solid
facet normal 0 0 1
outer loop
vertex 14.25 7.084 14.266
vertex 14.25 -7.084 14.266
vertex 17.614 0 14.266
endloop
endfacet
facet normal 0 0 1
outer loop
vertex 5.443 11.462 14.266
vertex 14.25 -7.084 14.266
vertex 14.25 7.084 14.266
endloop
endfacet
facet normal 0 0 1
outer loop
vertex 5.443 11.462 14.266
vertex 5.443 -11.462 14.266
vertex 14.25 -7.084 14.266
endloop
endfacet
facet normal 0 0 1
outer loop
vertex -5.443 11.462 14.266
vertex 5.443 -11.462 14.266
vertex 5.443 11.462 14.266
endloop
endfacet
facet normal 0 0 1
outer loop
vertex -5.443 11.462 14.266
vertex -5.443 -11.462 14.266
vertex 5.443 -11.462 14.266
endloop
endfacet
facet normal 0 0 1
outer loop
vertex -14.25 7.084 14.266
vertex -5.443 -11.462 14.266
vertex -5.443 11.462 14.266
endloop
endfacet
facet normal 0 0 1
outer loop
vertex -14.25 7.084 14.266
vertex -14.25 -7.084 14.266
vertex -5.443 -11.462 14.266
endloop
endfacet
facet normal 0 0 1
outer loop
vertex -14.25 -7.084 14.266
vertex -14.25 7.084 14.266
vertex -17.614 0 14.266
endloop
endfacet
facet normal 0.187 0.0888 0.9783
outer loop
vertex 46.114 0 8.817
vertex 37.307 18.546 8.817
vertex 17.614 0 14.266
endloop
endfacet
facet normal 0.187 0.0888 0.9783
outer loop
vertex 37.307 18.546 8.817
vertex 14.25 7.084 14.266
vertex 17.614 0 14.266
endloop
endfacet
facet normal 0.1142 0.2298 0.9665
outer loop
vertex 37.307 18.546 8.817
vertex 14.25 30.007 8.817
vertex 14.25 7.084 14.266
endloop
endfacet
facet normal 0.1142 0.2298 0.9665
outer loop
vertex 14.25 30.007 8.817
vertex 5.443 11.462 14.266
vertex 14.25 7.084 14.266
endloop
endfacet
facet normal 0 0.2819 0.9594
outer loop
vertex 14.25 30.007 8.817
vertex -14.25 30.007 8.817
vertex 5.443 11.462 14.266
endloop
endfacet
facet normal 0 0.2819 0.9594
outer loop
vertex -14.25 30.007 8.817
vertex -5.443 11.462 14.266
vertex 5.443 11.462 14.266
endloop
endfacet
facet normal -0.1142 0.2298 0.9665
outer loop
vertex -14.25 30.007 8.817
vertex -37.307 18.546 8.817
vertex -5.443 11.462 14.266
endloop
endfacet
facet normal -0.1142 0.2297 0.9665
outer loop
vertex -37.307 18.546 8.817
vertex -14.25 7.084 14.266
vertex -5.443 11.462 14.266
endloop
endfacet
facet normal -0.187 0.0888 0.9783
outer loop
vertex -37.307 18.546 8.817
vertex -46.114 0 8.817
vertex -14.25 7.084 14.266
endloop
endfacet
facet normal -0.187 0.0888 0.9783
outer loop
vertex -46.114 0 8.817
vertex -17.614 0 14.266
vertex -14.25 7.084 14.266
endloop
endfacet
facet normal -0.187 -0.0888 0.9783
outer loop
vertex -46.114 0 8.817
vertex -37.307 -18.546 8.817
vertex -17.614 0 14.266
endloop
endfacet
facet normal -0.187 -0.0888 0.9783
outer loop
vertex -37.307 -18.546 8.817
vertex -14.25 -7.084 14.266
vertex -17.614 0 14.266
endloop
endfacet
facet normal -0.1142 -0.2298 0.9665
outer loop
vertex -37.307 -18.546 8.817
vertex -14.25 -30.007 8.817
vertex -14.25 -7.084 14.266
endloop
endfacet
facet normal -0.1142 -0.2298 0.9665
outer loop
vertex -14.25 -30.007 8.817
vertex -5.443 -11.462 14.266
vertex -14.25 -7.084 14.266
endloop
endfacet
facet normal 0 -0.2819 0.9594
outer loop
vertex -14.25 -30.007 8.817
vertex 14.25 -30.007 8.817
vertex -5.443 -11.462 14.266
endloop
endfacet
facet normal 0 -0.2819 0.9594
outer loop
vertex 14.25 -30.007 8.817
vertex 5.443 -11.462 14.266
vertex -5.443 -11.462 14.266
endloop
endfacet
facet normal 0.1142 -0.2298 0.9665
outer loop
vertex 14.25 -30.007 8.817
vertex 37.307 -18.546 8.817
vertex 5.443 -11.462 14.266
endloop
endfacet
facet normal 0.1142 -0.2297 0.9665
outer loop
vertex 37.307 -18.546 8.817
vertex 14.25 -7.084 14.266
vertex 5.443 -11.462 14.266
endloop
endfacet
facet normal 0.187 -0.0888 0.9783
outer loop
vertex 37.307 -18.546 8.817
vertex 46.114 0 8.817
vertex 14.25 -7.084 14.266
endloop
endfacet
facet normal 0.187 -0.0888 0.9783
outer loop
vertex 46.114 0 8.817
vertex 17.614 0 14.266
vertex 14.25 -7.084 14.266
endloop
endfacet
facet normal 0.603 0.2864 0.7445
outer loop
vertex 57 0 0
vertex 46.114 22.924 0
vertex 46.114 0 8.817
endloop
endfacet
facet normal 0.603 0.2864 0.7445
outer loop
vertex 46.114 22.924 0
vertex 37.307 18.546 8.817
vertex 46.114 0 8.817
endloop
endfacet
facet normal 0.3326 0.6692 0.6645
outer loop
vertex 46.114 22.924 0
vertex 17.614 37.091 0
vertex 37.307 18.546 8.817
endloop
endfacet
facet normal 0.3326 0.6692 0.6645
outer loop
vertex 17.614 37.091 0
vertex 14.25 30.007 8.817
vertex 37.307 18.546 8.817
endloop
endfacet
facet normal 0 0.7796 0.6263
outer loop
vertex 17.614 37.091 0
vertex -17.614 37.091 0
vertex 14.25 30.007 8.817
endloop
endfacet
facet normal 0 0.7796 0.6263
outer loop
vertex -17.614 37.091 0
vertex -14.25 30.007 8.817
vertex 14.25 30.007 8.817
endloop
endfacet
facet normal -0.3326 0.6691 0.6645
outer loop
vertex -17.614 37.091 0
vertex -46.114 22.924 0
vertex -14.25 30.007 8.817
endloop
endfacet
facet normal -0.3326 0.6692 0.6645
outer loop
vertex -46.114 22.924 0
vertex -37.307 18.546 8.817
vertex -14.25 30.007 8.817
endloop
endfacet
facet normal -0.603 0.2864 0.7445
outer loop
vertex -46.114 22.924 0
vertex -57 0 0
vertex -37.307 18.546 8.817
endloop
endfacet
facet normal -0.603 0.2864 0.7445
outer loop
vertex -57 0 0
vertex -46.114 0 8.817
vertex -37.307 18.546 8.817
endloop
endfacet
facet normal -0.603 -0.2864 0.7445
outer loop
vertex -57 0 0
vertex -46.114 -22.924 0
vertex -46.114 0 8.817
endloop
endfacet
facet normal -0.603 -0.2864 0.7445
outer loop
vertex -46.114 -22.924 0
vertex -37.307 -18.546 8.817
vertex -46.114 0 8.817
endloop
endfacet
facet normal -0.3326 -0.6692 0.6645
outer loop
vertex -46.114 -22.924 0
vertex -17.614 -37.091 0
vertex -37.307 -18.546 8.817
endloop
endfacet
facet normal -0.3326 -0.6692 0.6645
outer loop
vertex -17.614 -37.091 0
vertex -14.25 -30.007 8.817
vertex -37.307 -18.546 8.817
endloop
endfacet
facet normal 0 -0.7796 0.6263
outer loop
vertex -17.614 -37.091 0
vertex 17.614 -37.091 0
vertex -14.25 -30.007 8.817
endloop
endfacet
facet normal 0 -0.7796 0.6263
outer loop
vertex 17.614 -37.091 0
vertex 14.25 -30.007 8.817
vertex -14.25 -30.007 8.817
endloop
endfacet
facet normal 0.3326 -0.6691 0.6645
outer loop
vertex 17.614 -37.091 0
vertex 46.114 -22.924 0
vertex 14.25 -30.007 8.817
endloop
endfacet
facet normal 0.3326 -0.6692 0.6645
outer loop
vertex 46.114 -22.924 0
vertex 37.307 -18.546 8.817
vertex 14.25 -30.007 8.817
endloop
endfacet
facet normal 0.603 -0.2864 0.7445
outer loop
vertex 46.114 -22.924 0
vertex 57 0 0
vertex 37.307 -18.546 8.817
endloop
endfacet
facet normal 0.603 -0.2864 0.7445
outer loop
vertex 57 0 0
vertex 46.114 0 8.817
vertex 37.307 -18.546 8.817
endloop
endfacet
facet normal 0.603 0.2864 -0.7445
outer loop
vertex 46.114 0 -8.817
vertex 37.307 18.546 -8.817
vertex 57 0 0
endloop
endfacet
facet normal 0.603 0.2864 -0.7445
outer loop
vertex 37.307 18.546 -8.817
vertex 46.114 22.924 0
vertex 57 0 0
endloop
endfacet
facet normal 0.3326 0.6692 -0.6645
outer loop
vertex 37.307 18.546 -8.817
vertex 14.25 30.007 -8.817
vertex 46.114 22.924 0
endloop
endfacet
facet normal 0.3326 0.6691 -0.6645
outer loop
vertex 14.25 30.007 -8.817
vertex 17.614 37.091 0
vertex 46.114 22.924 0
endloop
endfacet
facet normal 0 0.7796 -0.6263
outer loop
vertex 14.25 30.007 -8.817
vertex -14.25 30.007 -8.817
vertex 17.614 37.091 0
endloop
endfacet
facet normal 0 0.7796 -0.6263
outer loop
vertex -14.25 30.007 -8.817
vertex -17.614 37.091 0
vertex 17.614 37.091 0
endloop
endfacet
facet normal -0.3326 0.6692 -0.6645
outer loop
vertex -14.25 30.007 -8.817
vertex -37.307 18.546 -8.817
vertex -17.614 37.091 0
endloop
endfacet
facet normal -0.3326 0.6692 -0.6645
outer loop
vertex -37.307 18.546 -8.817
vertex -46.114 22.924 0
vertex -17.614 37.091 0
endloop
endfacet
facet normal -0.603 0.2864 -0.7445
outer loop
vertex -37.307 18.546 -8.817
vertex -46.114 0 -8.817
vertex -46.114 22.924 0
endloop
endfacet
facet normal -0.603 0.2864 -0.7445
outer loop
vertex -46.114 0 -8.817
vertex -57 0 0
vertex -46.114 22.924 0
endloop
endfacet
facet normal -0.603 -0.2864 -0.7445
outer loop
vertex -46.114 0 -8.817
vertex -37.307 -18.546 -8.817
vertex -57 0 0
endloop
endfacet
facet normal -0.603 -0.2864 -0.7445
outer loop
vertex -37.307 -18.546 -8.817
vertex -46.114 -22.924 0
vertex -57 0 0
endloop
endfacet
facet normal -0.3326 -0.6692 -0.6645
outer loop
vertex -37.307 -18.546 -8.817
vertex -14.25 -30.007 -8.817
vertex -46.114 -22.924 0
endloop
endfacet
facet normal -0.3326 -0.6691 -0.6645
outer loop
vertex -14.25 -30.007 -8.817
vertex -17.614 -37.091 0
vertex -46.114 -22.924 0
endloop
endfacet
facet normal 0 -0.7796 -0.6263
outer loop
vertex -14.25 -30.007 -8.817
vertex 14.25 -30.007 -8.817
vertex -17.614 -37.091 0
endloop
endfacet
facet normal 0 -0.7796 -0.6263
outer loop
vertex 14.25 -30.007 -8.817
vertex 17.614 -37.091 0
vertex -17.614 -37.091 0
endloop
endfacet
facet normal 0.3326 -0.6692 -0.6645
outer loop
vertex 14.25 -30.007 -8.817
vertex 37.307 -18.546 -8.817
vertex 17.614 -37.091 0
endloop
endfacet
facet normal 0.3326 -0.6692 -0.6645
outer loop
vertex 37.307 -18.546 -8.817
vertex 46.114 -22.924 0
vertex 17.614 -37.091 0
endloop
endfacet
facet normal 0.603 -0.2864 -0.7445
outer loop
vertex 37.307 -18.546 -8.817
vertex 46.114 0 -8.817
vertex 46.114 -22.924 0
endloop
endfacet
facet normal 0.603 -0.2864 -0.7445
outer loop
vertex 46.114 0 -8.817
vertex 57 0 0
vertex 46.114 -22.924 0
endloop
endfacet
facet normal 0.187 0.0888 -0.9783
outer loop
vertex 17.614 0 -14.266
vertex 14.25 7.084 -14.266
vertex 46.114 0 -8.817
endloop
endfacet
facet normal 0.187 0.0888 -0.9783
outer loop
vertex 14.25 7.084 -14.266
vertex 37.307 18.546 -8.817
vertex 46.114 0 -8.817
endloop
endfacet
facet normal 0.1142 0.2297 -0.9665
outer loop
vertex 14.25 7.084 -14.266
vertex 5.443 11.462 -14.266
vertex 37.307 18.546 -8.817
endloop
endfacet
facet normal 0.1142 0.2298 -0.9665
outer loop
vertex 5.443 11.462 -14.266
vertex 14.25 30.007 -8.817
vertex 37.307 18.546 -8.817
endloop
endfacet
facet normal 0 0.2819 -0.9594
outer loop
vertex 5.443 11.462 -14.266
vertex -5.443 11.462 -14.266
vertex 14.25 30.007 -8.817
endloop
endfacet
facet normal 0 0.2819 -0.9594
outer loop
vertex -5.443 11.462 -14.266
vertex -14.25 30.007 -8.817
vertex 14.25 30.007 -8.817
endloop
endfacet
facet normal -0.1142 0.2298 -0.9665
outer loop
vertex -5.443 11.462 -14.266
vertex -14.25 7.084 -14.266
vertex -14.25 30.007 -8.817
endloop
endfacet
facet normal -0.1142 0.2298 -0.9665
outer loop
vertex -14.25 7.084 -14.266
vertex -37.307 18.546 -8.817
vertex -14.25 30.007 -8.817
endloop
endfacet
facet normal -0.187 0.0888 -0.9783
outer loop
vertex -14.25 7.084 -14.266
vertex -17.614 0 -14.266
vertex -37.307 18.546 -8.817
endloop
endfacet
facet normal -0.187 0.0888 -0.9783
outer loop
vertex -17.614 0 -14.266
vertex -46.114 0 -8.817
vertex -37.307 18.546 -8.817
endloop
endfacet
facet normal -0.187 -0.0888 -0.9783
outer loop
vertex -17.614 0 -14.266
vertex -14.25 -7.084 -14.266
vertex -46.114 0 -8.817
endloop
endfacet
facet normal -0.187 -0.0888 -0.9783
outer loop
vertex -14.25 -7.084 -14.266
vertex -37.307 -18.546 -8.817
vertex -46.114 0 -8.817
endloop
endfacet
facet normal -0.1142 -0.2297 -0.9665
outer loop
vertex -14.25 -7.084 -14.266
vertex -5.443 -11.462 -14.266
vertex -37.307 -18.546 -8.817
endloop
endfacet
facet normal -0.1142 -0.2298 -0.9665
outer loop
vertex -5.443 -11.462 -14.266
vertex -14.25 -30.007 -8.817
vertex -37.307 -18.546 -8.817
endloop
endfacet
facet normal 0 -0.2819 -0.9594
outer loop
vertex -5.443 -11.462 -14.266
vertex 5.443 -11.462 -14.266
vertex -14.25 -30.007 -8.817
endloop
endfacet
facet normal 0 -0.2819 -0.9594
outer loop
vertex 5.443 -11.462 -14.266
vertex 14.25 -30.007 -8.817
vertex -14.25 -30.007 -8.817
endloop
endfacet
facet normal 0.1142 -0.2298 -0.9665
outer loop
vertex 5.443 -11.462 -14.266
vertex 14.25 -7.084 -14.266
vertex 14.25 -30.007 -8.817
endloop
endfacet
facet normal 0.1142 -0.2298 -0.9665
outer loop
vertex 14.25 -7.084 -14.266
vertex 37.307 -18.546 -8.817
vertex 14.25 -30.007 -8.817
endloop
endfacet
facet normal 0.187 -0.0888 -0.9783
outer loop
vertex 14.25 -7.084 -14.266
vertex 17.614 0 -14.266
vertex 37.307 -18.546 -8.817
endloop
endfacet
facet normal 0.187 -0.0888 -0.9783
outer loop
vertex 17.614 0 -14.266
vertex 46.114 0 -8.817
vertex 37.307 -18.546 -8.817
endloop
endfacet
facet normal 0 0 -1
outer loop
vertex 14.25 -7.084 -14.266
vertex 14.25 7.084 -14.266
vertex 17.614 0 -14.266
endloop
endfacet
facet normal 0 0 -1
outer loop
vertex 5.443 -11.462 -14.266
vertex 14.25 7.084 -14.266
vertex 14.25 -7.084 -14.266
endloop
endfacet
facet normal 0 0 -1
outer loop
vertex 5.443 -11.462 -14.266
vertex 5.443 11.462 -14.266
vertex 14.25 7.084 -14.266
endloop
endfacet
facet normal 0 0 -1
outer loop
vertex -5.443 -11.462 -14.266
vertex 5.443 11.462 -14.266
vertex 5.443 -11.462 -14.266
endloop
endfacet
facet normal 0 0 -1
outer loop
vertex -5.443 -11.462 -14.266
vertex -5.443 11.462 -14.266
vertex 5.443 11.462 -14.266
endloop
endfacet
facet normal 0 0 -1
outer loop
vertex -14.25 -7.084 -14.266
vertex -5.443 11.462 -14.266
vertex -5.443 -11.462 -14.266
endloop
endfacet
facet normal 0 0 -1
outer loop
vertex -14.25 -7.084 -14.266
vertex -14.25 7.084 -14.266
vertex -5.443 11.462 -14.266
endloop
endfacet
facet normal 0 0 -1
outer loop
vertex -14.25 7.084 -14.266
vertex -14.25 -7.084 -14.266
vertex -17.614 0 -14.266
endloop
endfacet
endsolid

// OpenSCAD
// Generated by SolidPython 1.0.1 on 2020-07-29 00:46:54


scale(v = [19, 13, 5]) {
	sphere(r = 3);
}
/***********************************************
*********      SolidPython code:      **********
************************************************
 
# import packages: SolidPython
from solid import *
from solid.utils import *
from itertools import chain, combinations, permutations


class Resize:

    def __init__(self, scad_file):
        self.scad_file = scad_file
        #self.scad_file = import_scad(scad_file)
        # cone/cylinder param:
        self.r1 = 0
        self.r2 = 0
        self.h = 0
        # rectangular prism param:
        self.w = 0
        self.l = 0
        # ellipse param:
        self.r = 0

    # import OpenScad code (file name corresponds to shape)


    # classify shape + parameters
    def assign(self, param1, param2, param3):
        if self.scad_file == 'cone.scad':
            self.r1 = param1
            self.r2 = param2
            self.h = param3
        elif self.scad_file == 'cylinder.scad':
            self.r1 = param1
            self.r2 = param2
            self.h = param3
        elif self.scad_file == 'rectangularPrism.scad':
            self.h = param1
            self.l = param2
            self.w = param3
        else:
            self.r = param1
            self.h = param2

    # resize parameters
    def iterate(self):
        x = range(3, 20, 2)
        i = 1
        if self.scad_file == 'cone.scad':
            tempList = list(permutations(x, 2))
            for temp in tempList:
                param1 = temp[0]
                param2 = temp[1]
                filepath = 'produced_scad_files/' + 'cone' + str(param1) + '_' + str(param2) + '_' + '.scad'
                scad_render_to_file(cylinder(h=param1, r1=param2, r2=0), filepath)

        elif self.scad_file == 'cylinder.scad':
            tempList = list(permutations(x, 3))
            for temp in tempList:
                param1 = temp[0]
                param2 = temp[1]
                filepath = 'produced_scad_files/' + 'cylinder' + str(param1) + '_' + str(param2) + '_' + '.scad'
                scad_render_to_file(cylinder(h=param1, r1=param2, r2=param2), filepath)

        elif self.scad_file == 'rectangularPrism.scad':
            tempList = list(permutations(x, 3))
            for temp in tempList:
                param1 = temp[0]
                param2 = temp[1]
                param3 = temp[2]
                filepath = 'produced_scad_files/' + 'rectangularPrism' + str(param1) + '_' + str(param2) + '_' + str(
                    param3) + '.scad'
                scad_render_to_file(cube(size=(param1, param2, param3)), filepath)

        elif self.scad_file == 'ellipse.scad':
            tempList = list(permutations(x, 4))
            for temp in tempList:
                param1 = temp[0]
                param2 = temp[1]
                param3 = temp[2]
                param4 = temp[3]
                filepath = 'produced_scad_files/' + 'ellipse' + str(param1) + '_' + str(param2) + '_' + str(param3) + '_' + str(param4) + '.scad'
                scad_render_to_file(scale([param1, param2, param3])(sphere(r=param4)), filepath)

    def render_to_scadfile(self):
        scad_render_to_file(scad, 'example.scad') 
 
************************************************/
